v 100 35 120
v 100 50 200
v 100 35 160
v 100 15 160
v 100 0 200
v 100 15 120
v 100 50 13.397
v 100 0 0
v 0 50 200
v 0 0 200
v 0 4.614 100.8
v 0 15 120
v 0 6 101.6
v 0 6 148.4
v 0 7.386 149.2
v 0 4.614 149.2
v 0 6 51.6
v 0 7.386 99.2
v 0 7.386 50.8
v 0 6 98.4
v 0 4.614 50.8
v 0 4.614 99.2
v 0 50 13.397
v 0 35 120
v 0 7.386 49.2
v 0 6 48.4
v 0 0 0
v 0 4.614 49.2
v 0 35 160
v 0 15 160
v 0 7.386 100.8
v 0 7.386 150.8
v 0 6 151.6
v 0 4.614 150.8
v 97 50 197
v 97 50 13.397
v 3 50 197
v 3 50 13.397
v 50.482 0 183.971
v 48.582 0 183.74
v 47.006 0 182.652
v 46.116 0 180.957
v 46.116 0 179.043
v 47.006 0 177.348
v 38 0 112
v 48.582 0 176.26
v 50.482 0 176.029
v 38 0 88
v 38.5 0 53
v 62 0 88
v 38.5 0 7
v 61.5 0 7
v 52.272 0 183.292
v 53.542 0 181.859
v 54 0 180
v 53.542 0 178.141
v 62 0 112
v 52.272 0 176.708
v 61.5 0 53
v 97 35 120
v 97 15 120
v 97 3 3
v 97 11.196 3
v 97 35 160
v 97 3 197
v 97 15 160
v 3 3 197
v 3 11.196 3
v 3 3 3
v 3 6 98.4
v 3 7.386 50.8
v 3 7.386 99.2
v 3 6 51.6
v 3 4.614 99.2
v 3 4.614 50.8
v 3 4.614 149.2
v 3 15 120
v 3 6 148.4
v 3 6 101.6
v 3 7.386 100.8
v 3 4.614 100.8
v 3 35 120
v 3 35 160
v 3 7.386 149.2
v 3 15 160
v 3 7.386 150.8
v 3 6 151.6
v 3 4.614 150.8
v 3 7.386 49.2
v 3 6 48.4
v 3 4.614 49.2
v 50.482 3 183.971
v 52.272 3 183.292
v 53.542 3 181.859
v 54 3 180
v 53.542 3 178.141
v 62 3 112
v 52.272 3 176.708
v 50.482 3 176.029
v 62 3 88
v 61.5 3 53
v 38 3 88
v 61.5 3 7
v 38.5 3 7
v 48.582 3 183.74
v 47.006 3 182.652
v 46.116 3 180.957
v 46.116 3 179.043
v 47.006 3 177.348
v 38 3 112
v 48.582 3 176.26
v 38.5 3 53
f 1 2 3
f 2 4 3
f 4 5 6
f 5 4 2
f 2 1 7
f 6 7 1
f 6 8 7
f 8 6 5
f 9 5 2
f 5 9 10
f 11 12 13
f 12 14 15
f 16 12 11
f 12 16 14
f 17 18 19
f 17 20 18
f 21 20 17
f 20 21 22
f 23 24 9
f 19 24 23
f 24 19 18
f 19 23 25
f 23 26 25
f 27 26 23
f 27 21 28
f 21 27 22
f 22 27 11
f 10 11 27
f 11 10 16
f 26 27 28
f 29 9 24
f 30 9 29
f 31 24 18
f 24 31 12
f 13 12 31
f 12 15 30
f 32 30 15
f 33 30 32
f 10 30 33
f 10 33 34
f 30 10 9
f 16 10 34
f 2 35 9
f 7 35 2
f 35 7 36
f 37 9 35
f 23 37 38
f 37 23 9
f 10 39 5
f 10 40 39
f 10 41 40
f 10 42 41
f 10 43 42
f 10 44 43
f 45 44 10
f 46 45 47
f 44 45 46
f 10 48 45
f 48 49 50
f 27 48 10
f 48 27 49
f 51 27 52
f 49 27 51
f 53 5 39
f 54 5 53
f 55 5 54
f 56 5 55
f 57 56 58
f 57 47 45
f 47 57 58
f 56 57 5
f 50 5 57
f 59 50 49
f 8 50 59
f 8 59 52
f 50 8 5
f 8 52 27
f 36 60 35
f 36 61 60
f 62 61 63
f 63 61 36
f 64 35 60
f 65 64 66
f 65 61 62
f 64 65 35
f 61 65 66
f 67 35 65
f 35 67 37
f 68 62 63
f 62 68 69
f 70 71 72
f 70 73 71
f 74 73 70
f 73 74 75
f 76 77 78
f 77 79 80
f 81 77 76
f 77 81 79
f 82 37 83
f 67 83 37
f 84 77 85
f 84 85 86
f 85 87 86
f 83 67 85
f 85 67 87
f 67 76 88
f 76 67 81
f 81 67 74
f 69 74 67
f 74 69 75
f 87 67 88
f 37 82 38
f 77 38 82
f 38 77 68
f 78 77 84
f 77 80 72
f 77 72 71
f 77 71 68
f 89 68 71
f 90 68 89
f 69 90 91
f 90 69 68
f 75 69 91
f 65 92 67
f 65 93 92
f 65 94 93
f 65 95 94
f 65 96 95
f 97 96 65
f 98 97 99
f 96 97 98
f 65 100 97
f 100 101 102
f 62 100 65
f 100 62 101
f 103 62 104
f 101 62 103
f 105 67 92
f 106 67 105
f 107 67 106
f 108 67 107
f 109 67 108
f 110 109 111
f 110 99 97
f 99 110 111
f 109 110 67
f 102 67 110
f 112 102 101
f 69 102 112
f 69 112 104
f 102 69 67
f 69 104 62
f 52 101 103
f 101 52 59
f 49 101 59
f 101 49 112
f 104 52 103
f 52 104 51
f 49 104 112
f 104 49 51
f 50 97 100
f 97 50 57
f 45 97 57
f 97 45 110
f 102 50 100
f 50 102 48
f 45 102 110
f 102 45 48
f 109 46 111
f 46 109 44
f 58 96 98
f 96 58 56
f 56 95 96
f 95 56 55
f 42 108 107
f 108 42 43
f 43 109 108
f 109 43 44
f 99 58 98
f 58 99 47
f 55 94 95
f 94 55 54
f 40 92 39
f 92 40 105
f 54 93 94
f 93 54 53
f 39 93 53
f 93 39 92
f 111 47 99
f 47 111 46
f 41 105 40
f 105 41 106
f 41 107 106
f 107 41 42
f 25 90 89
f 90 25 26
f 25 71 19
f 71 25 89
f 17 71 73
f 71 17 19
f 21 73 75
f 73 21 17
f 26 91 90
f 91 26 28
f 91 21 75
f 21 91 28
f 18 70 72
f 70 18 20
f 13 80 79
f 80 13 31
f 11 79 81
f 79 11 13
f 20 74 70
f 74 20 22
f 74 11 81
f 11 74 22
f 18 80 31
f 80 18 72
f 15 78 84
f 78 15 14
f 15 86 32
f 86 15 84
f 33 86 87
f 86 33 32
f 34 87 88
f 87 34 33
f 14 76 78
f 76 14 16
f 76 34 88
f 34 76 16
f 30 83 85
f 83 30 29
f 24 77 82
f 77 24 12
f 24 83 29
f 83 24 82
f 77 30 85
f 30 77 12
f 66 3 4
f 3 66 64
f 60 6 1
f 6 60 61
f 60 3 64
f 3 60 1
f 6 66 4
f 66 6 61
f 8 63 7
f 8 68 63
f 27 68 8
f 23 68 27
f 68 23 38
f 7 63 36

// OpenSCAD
difference() {
	cube(size = [100.0, 50.0, 200.0]);
	translate(v = [3.0, 3.0, 3.0]) {
		cube(size = [94.0, 50.0, 194.0]);
	}
	translate(v = [38.5, -5, 7.0]) {
		cube(size = [23.0, 13.0, 46.0]);
	}
	translate(v = [38.0, -5, 88.0]) {
		cube(size = [24.0, 13.0, 24.0]);
	}
	translate(v = [50.0, -5, 180.0]) {
		rotate(a = [-90, 0, 0]) {
			cylinder(d = 8.0, h = 13.0);
		}
	}
	translate(v = [-5, 6, 50]) {
		rotate(a = [0, 90, 0]) {
			cylinder(d = 3.2, h = 13.0);
		}
	}
	translate(v = [-5, 6, 100]) {
		rotate(a = [0, 90, 0]) {
			cylinder(d = 3.2, h = 13.0);
		}
	}
	translate(v = [-5, 6, 150]) {
		rotate(a = [0, 90, 0]) {
			cylinder(d = 3.2, h = 13.0);
		}
	}
	translate(v = [-5, 15, 120]) {
		cube(size = [13.0, 20, 40]);
	}
	translate(v = [95.0, 15, 120]) {
		cube(size = [13.0, 20, 40]);
	}
	rotate(a = [15.0, 0, 0]) {
		translate(v = [-10, -10, -50]) {
			cube(size = [120.0, 100.0, 50]);
		}
	}
}
